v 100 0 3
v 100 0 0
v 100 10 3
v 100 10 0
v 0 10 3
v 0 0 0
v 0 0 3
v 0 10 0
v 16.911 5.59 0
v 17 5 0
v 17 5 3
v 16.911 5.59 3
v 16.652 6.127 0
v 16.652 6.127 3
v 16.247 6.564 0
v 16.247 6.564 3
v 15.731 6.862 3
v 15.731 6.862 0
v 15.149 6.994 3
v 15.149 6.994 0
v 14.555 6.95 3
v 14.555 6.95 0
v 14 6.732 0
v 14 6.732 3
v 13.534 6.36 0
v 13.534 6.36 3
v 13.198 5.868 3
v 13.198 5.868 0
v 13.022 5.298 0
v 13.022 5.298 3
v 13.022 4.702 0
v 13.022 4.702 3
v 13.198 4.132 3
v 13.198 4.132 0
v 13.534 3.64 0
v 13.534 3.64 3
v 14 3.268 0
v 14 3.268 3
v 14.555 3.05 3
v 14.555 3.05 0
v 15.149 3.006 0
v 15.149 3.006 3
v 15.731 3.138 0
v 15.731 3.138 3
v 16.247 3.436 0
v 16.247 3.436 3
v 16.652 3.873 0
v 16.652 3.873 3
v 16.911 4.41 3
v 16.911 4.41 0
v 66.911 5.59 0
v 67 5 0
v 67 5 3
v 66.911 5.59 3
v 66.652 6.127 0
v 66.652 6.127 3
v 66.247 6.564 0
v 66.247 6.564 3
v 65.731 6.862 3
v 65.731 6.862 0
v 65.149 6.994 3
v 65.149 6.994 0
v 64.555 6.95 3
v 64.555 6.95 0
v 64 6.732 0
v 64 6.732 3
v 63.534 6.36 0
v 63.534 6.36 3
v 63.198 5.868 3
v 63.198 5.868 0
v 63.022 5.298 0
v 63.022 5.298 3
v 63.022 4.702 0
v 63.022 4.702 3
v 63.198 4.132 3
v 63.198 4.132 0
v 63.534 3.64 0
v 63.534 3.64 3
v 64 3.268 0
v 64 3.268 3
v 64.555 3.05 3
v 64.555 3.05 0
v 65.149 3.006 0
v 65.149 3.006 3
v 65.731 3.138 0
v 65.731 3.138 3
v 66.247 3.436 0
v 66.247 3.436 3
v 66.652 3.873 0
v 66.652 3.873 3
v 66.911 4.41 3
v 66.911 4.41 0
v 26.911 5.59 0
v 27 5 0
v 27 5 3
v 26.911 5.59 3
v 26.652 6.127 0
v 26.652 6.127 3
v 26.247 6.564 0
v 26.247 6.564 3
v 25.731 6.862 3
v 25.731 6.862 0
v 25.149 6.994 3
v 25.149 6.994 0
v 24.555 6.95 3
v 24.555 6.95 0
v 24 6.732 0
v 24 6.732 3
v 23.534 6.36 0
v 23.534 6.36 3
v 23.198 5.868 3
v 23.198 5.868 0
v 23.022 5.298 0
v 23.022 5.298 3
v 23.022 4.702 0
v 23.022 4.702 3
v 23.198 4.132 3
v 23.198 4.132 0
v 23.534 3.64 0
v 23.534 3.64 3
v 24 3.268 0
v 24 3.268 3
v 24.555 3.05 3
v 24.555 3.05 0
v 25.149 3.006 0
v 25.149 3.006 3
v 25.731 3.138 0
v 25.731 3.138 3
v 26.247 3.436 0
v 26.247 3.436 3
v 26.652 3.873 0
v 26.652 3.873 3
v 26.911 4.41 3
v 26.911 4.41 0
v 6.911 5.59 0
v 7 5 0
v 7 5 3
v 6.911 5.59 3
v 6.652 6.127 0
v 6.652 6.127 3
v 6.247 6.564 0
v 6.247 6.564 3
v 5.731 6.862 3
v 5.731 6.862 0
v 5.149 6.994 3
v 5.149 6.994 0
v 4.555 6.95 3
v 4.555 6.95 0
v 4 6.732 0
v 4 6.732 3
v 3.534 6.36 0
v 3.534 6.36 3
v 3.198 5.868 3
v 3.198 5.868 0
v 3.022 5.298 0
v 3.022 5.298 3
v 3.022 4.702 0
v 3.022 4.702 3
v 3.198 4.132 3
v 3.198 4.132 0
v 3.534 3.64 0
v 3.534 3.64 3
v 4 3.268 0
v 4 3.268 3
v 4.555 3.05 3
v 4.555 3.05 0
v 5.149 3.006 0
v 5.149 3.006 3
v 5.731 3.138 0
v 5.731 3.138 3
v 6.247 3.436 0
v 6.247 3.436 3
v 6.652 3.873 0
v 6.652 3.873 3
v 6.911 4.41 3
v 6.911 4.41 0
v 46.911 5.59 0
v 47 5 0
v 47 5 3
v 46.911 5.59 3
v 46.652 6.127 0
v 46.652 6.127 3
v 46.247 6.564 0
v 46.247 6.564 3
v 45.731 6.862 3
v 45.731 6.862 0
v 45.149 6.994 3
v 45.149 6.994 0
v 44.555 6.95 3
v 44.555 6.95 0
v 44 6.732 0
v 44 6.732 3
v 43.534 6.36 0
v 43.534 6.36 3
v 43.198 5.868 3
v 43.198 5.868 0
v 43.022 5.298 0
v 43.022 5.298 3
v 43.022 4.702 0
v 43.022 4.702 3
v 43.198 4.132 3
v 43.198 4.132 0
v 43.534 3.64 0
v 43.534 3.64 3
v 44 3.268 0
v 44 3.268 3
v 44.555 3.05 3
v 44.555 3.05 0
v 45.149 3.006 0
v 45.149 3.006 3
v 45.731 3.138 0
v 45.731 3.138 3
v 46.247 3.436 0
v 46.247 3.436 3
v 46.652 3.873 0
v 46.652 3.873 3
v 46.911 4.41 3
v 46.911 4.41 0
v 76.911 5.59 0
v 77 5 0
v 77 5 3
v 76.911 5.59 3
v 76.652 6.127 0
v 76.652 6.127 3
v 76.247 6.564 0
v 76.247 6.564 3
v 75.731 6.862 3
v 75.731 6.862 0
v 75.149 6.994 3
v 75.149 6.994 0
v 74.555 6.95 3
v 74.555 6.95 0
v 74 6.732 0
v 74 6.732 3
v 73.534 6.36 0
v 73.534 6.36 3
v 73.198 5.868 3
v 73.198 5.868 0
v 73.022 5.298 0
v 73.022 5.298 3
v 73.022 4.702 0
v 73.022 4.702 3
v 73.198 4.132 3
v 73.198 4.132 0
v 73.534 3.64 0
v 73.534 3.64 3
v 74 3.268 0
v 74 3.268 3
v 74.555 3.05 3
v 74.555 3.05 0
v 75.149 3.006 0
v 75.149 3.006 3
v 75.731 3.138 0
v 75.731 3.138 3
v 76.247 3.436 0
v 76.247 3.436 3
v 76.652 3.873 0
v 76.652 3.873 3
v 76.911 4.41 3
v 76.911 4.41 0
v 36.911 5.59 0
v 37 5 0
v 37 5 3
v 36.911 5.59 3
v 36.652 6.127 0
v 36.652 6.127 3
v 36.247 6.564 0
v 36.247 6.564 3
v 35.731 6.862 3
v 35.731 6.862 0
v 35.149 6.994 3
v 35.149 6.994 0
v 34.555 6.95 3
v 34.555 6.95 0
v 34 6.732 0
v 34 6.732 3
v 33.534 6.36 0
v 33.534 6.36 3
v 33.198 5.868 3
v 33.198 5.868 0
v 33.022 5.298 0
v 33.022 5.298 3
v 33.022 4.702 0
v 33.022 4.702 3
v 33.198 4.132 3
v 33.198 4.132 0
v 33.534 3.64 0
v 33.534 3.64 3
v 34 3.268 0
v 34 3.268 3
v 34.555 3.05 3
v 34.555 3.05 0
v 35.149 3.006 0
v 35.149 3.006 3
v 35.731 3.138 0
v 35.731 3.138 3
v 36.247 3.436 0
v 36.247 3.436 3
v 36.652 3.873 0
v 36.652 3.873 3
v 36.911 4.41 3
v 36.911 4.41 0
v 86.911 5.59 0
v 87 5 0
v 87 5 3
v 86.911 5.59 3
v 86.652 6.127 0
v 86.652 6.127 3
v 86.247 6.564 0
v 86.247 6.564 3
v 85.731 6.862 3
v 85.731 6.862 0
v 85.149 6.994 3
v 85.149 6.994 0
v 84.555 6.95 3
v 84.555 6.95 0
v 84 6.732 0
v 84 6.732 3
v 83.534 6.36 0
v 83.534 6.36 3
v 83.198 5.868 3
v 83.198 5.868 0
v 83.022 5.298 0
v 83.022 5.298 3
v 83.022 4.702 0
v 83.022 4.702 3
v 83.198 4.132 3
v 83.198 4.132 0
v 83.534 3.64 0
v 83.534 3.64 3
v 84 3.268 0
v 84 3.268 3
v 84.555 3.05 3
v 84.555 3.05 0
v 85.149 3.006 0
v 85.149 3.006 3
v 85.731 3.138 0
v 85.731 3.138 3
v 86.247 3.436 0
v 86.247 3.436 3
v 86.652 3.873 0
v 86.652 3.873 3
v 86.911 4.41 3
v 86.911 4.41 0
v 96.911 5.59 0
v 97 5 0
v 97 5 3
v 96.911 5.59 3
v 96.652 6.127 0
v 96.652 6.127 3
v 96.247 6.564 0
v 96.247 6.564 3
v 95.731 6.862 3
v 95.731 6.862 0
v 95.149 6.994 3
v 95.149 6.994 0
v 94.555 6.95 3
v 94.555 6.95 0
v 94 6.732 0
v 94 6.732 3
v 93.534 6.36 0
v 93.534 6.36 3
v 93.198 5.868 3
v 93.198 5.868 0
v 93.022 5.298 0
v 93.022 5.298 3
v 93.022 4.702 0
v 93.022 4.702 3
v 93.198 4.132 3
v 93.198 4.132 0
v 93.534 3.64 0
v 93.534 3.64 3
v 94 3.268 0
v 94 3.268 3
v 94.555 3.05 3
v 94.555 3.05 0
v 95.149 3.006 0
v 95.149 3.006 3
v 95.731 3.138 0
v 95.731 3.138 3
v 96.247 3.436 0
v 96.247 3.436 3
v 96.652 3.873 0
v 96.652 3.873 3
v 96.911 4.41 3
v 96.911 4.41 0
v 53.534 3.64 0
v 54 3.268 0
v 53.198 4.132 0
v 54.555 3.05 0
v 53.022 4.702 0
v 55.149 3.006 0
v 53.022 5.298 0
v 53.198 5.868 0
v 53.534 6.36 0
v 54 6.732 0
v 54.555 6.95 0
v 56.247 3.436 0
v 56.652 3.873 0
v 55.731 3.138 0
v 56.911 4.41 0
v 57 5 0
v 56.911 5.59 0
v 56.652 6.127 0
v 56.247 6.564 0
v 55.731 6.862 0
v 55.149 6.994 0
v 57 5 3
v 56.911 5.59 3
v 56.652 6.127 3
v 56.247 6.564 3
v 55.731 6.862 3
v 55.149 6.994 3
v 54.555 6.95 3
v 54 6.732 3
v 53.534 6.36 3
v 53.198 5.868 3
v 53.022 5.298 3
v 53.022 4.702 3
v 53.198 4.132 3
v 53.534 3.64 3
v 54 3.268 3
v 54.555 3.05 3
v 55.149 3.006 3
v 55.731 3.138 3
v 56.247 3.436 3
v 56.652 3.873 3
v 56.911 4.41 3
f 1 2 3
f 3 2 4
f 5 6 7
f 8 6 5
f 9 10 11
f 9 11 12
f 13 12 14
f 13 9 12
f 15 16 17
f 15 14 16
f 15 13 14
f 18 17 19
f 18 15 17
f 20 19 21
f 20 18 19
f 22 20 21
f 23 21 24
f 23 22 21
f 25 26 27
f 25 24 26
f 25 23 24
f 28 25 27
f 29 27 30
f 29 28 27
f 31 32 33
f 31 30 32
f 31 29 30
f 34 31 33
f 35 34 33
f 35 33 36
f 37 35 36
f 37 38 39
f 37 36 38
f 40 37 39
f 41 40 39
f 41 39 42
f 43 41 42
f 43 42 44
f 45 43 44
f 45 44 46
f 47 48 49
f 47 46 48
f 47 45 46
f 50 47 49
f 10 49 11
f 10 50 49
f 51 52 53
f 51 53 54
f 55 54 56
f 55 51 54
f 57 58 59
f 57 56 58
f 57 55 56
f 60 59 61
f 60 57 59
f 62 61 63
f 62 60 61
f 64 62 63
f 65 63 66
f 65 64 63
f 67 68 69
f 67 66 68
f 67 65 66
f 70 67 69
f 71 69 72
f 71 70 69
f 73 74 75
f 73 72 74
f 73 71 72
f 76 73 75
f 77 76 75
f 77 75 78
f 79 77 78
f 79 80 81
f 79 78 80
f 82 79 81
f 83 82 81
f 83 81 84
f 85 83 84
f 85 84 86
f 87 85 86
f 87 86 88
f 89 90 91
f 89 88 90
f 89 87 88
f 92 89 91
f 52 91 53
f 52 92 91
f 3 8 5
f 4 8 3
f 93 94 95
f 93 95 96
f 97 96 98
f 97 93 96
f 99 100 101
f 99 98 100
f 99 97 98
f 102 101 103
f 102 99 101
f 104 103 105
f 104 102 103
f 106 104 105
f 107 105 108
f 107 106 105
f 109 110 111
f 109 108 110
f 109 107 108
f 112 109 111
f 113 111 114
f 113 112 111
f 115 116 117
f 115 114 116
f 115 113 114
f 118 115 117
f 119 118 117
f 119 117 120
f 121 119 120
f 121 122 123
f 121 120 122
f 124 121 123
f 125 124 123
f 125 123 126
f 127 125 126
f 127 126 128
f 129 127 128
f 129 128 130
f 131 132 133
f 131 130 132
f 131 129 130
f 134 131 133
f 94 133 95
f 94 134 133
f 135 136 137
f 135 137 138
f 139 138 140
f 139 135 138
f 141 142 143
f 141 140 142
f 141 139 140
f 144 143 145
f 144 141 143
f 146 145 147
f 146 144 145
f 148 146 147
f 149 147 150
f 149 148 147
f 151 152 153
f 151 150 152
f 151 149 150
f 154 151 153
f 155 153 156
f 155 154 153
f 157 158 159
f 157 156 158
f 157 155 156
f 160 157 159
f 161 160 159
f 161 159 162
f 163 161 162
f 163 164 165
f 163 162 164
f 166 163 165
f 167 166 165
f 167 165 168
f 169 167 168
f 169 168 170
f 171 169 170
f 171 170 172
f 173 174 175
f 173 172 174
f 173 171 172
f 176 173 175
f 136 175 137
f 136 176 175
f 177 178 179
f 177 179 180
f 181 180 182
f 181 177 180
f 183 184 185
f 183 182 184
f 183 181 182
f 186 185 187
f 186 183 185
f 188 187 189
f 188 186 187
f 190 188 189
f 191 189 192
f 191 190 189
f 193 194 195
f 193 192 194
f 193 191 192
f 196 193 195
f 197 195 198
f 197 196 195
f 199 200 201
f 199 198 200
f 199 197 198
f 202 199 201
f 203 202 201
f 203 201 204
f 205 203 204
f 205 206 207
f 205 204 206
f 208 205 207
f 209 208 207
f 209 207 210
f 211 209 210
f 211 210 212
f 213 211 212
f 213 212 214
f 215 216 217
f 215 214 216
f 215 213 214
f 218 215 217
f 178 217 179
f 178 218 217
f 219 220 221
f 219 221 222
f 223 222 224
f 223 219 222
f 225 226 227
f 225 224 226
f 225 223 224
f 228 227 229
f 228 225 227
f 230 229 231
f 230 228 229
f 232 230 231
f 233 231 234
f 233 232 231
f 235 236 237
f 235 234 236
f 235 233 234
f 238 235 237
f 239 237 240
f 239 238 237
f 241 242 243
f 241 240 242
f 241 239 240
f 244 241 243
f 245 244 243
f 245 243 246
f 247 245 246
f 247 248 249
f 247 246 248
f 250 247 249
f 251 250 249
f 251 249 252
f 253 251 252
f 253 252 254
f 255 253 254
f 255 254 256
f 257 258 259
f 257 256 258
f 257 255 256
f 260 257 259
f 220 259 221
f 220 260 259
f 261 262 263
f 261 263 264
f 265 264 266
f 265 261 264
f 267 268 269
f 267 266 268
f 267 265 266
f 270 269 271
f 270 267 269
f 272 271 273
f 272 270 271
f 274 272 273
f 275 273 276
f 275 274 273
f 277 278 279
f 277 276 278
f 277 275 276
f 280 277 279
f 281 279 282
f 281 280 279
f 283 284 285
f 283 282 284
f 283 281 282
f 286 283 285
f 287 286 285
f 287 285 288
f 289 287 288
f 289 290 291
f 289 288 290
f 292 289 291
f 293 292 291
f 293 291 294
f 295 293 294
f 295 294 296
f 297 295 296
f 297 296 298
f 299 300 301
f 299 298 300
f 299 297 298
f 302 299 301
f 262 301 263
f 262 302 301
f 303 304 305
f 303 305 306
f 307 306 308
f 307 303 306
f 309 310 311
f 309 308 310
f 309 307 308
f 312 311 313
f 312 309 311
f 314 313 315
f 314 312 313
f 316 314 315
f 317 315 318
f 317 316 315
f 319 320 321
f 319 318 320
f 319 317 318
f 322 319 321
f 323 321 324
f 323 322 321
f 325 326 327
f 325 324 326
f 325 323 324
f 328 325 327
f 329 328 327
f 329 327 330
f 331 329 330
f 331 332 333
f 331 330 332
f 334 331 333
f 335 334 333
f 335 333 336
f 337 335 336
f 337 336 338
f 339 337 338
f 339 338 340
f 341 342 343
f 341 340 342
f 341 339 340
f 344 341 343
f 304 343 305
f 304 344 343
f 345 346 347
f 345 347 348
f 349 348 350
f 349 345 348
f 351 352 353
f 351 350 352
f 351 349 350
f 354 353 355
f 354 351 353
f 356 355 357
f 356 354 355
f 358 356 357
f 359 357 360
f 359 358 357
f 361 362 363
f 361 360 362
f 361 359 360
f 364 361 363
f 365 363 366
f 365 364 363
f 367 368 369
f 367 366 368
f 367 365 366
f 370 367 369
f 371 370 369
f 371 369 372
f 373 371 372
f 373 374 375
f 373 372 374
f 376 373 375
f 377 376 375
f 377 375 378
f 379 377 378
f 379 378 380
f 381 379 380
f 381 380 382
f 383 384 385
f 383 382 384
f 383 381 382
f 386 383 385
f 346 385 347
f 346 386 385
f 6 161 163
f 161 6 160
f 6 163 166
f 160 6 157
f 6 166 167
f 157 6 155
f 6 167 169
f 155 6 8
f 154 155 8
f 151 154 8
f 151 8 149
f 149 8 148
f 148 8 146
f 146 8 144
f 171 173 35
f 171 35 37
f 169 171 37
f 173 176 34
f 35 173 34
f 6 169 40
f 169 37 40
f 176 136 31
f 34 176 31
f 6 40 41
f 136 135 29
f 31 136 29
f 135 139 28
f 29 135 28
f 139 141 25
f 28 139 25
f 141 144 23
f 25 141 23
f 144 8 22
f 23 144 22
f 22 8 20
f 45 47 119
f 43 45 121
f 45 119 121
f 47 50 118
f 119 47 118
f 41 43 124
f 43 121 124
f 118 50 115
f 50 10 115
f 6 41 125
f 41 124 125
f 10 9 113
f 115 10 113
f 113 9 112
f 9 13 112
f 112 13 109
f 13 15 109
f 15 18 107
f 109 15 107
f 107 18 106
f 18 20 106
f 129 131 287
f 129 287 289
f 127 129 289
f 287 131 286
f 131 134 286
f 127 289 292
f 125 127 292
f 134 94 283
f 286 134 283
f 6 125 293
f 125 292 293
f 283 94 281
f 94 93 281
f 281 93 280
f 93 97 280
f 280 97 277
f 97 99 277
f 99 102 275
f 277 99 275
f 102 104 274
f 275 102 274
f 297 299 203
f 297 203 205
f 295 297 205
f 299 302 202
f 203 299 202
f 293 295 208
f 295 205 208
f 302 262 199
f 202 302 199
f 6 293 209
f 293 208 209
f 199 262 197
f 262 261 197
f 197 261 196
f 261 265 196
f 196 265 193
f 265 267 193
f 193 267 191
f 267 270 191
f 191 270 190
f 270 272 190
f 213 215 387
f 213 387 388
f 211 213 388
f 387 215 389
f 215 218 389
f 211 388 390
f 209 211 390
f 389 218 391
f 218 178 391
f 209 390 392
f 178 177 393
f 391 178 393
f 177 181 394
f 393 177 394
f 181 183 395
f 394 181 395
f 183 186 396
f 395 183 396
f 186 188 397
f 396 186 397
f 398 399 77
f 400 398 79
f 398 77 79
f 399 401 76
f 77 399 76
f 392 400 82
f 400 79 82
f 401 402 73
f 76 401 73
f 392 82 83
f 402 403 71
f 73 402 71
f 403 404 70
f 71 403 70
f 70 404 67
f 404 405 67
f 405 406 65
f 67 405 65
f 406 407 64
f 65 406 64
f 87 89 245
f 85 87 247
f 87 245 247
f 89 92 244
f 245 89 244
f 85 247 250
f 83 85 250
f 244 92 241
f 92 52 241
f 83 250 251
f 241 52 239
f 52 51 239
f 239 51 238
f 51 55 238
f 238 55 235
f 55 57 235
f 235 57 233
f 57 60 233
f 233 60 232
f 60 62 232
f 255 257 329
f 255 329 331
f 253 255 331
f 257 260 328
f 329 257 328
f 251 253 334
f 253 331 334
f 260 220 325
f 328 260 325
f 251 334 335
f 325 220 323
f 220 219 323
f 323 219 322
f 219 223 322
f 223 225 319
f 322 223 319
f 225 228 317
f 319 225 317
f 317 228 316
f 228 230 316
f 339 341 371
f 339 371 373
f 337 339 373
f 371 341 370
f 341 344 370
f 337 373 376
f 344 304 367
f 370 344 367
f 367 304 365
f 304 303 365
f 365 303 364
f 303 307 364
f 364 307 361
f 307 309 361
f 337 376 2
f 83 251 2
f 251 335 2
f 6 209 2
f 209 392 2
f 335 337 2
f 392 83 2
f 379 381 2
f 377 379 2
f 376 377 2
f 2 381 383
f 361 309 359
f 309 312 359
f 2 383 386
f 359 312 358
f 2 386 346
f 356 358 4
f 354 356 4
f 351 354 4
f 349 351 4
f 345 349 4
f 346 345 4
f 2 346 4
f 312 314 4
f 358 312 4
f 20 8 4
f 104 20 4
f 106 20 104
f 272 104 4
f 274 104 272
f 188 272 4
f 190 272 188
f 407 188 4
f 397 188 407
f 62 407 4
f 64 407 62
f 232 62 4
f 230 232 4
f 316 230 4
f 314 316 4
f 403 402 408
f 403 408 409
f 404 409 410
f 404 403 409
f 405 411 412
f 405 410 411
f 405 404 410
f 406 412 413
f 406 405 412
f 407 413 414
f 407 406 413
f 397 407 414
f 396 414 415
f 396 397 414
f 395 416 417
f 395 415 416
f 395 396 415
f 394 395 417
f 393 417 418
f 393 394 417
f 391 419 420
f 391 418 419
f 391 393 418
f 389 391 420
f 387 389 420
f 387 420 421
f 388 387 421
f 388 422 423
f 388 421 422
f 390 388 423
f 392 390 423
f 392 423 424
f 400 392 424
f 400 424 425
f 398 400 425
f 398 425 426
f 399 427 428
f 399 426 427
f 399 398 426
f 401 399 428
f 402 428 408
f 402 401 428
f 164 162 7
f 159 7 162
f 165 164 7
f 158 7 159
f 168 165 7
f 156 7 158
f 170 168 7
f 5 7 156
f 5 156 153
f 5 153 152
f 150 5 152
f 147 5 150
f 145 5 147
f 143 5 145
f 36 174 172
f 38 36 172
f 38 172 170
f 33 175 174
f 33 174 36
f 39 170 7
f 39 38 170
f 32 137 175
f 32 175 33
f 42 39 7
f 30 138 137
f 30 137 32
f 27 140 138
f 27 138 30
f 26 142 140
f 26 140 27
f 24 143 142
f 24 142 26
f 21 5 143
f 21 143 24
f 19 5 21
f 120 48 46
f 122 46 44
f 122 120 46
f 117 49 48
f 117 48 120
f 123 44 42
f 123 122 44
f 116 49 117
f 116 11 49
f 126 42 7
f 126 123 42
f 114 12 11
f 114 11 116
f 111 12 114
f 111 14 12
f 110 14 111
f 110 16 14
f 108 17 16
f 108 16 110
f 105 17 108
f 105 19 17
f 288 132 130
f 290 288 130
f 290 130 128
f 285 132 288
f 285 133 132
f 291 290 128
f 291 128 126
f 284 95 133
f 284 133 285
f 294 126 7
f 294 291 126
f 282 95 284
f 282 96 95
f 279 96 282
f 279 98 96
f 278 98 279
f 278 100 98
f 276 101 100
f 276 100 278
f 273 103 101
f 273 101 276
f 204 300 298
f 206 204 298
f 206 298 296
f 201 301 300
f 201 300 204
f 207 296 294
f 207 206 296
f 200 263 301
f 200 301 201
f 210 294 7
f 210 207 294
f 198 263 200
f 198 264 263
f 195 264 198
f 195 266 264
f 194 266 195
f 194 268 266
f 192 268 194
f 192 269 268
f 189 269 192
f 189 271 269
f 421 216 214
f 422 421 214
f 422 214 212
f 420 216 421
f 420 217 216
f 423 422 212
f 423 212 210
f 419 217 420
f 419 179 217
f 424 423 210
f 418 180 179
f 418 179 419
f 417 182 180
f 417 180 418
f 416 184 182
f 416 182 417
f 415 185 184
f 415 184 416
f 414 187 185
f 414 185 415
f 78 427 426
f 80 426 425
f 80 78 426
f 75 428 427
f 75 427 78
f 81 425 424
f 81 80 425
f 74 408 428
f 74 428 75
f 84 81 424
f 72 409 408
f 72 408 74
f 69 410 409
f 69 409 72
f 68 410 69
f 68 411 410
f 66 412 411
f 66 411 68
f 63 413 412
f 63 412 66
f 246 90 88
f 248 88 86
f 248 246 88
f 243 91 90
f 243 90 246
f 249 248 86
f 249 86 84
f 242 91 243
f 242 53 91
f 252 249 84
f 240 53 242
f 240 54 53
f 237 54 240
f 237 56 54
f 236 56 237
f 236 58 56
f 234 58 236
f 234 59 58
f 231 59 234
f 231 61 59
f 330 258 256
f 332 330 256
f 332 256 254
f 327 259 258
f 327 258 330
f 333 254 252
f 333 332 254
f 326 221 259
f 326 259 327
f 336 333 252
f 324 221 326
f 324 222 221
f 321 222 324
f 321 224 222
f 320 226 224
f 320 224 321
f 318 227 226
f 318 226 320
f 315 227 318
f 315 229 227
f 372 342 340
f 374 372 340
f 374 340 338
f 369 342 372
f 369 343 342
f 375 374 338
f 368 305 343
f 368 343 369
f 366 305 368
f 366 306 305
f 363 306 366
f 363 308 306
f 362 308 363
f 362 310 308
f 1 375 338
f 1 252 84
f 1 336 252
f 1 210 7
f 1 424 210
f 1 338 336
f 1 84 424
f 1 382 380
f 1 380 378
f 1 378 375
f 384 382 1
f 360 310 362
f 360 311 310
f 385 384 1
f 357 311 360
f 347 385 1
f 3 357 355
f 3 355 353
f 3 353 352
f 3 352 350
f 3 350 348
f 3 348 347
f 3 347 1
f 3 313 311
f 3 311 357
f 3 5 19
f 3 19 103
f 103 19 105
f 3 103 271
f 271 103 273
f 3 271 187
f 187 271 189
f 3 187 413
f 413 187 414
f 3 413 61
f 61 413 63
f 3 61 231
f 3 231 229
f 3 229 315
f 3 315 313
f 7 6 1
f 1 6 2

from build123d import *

# Parameters (mm, degrees)
CYLINDER_R     = 2
CYLINDER_DEPTH = 10
BOX_W          = 10
BOX_H          = 10
BOX_DEPTH      = 3
ARRAY_X_COUNT  = 10
ARRAY_X_PITCH  = 10


with BuildPart() as cilindro:
    # Cylinder → Cylinder (new body)
    with BuildSketch(Plane(origin=(5, 5, -3), x_dir=(1, 0, 0), z_dir=(0, 0, 1))):
        Circle(CYLINDER_R)
    extrude(amount=CYLINDER_DEPTH)


with BuildPart() as pieza_mecano:
    # Box → Box (new body)
    with BuildSketch(Plane.XY):
        with Locations((5, 5)):
            Rectangle(BOX_W, BOX_H)
    extrude(amount=BOX_DEPTH)

    # Cut: cut Cilindro
    add(cilindro.part, mode=Mode.SUBTRACT)

    # Array X: Pieza-mecano ×10


with BuildPart() as pieza_mecano_1:
    add(pieza_mecano.part)
    with Locations(*[(i * ARRAY_X_PITCH, 0, 0) for i in range(1, ARRAY_X_COUNT)]):
        add(pieza_mecano.part)


solid = pieza_mecano_1.part
